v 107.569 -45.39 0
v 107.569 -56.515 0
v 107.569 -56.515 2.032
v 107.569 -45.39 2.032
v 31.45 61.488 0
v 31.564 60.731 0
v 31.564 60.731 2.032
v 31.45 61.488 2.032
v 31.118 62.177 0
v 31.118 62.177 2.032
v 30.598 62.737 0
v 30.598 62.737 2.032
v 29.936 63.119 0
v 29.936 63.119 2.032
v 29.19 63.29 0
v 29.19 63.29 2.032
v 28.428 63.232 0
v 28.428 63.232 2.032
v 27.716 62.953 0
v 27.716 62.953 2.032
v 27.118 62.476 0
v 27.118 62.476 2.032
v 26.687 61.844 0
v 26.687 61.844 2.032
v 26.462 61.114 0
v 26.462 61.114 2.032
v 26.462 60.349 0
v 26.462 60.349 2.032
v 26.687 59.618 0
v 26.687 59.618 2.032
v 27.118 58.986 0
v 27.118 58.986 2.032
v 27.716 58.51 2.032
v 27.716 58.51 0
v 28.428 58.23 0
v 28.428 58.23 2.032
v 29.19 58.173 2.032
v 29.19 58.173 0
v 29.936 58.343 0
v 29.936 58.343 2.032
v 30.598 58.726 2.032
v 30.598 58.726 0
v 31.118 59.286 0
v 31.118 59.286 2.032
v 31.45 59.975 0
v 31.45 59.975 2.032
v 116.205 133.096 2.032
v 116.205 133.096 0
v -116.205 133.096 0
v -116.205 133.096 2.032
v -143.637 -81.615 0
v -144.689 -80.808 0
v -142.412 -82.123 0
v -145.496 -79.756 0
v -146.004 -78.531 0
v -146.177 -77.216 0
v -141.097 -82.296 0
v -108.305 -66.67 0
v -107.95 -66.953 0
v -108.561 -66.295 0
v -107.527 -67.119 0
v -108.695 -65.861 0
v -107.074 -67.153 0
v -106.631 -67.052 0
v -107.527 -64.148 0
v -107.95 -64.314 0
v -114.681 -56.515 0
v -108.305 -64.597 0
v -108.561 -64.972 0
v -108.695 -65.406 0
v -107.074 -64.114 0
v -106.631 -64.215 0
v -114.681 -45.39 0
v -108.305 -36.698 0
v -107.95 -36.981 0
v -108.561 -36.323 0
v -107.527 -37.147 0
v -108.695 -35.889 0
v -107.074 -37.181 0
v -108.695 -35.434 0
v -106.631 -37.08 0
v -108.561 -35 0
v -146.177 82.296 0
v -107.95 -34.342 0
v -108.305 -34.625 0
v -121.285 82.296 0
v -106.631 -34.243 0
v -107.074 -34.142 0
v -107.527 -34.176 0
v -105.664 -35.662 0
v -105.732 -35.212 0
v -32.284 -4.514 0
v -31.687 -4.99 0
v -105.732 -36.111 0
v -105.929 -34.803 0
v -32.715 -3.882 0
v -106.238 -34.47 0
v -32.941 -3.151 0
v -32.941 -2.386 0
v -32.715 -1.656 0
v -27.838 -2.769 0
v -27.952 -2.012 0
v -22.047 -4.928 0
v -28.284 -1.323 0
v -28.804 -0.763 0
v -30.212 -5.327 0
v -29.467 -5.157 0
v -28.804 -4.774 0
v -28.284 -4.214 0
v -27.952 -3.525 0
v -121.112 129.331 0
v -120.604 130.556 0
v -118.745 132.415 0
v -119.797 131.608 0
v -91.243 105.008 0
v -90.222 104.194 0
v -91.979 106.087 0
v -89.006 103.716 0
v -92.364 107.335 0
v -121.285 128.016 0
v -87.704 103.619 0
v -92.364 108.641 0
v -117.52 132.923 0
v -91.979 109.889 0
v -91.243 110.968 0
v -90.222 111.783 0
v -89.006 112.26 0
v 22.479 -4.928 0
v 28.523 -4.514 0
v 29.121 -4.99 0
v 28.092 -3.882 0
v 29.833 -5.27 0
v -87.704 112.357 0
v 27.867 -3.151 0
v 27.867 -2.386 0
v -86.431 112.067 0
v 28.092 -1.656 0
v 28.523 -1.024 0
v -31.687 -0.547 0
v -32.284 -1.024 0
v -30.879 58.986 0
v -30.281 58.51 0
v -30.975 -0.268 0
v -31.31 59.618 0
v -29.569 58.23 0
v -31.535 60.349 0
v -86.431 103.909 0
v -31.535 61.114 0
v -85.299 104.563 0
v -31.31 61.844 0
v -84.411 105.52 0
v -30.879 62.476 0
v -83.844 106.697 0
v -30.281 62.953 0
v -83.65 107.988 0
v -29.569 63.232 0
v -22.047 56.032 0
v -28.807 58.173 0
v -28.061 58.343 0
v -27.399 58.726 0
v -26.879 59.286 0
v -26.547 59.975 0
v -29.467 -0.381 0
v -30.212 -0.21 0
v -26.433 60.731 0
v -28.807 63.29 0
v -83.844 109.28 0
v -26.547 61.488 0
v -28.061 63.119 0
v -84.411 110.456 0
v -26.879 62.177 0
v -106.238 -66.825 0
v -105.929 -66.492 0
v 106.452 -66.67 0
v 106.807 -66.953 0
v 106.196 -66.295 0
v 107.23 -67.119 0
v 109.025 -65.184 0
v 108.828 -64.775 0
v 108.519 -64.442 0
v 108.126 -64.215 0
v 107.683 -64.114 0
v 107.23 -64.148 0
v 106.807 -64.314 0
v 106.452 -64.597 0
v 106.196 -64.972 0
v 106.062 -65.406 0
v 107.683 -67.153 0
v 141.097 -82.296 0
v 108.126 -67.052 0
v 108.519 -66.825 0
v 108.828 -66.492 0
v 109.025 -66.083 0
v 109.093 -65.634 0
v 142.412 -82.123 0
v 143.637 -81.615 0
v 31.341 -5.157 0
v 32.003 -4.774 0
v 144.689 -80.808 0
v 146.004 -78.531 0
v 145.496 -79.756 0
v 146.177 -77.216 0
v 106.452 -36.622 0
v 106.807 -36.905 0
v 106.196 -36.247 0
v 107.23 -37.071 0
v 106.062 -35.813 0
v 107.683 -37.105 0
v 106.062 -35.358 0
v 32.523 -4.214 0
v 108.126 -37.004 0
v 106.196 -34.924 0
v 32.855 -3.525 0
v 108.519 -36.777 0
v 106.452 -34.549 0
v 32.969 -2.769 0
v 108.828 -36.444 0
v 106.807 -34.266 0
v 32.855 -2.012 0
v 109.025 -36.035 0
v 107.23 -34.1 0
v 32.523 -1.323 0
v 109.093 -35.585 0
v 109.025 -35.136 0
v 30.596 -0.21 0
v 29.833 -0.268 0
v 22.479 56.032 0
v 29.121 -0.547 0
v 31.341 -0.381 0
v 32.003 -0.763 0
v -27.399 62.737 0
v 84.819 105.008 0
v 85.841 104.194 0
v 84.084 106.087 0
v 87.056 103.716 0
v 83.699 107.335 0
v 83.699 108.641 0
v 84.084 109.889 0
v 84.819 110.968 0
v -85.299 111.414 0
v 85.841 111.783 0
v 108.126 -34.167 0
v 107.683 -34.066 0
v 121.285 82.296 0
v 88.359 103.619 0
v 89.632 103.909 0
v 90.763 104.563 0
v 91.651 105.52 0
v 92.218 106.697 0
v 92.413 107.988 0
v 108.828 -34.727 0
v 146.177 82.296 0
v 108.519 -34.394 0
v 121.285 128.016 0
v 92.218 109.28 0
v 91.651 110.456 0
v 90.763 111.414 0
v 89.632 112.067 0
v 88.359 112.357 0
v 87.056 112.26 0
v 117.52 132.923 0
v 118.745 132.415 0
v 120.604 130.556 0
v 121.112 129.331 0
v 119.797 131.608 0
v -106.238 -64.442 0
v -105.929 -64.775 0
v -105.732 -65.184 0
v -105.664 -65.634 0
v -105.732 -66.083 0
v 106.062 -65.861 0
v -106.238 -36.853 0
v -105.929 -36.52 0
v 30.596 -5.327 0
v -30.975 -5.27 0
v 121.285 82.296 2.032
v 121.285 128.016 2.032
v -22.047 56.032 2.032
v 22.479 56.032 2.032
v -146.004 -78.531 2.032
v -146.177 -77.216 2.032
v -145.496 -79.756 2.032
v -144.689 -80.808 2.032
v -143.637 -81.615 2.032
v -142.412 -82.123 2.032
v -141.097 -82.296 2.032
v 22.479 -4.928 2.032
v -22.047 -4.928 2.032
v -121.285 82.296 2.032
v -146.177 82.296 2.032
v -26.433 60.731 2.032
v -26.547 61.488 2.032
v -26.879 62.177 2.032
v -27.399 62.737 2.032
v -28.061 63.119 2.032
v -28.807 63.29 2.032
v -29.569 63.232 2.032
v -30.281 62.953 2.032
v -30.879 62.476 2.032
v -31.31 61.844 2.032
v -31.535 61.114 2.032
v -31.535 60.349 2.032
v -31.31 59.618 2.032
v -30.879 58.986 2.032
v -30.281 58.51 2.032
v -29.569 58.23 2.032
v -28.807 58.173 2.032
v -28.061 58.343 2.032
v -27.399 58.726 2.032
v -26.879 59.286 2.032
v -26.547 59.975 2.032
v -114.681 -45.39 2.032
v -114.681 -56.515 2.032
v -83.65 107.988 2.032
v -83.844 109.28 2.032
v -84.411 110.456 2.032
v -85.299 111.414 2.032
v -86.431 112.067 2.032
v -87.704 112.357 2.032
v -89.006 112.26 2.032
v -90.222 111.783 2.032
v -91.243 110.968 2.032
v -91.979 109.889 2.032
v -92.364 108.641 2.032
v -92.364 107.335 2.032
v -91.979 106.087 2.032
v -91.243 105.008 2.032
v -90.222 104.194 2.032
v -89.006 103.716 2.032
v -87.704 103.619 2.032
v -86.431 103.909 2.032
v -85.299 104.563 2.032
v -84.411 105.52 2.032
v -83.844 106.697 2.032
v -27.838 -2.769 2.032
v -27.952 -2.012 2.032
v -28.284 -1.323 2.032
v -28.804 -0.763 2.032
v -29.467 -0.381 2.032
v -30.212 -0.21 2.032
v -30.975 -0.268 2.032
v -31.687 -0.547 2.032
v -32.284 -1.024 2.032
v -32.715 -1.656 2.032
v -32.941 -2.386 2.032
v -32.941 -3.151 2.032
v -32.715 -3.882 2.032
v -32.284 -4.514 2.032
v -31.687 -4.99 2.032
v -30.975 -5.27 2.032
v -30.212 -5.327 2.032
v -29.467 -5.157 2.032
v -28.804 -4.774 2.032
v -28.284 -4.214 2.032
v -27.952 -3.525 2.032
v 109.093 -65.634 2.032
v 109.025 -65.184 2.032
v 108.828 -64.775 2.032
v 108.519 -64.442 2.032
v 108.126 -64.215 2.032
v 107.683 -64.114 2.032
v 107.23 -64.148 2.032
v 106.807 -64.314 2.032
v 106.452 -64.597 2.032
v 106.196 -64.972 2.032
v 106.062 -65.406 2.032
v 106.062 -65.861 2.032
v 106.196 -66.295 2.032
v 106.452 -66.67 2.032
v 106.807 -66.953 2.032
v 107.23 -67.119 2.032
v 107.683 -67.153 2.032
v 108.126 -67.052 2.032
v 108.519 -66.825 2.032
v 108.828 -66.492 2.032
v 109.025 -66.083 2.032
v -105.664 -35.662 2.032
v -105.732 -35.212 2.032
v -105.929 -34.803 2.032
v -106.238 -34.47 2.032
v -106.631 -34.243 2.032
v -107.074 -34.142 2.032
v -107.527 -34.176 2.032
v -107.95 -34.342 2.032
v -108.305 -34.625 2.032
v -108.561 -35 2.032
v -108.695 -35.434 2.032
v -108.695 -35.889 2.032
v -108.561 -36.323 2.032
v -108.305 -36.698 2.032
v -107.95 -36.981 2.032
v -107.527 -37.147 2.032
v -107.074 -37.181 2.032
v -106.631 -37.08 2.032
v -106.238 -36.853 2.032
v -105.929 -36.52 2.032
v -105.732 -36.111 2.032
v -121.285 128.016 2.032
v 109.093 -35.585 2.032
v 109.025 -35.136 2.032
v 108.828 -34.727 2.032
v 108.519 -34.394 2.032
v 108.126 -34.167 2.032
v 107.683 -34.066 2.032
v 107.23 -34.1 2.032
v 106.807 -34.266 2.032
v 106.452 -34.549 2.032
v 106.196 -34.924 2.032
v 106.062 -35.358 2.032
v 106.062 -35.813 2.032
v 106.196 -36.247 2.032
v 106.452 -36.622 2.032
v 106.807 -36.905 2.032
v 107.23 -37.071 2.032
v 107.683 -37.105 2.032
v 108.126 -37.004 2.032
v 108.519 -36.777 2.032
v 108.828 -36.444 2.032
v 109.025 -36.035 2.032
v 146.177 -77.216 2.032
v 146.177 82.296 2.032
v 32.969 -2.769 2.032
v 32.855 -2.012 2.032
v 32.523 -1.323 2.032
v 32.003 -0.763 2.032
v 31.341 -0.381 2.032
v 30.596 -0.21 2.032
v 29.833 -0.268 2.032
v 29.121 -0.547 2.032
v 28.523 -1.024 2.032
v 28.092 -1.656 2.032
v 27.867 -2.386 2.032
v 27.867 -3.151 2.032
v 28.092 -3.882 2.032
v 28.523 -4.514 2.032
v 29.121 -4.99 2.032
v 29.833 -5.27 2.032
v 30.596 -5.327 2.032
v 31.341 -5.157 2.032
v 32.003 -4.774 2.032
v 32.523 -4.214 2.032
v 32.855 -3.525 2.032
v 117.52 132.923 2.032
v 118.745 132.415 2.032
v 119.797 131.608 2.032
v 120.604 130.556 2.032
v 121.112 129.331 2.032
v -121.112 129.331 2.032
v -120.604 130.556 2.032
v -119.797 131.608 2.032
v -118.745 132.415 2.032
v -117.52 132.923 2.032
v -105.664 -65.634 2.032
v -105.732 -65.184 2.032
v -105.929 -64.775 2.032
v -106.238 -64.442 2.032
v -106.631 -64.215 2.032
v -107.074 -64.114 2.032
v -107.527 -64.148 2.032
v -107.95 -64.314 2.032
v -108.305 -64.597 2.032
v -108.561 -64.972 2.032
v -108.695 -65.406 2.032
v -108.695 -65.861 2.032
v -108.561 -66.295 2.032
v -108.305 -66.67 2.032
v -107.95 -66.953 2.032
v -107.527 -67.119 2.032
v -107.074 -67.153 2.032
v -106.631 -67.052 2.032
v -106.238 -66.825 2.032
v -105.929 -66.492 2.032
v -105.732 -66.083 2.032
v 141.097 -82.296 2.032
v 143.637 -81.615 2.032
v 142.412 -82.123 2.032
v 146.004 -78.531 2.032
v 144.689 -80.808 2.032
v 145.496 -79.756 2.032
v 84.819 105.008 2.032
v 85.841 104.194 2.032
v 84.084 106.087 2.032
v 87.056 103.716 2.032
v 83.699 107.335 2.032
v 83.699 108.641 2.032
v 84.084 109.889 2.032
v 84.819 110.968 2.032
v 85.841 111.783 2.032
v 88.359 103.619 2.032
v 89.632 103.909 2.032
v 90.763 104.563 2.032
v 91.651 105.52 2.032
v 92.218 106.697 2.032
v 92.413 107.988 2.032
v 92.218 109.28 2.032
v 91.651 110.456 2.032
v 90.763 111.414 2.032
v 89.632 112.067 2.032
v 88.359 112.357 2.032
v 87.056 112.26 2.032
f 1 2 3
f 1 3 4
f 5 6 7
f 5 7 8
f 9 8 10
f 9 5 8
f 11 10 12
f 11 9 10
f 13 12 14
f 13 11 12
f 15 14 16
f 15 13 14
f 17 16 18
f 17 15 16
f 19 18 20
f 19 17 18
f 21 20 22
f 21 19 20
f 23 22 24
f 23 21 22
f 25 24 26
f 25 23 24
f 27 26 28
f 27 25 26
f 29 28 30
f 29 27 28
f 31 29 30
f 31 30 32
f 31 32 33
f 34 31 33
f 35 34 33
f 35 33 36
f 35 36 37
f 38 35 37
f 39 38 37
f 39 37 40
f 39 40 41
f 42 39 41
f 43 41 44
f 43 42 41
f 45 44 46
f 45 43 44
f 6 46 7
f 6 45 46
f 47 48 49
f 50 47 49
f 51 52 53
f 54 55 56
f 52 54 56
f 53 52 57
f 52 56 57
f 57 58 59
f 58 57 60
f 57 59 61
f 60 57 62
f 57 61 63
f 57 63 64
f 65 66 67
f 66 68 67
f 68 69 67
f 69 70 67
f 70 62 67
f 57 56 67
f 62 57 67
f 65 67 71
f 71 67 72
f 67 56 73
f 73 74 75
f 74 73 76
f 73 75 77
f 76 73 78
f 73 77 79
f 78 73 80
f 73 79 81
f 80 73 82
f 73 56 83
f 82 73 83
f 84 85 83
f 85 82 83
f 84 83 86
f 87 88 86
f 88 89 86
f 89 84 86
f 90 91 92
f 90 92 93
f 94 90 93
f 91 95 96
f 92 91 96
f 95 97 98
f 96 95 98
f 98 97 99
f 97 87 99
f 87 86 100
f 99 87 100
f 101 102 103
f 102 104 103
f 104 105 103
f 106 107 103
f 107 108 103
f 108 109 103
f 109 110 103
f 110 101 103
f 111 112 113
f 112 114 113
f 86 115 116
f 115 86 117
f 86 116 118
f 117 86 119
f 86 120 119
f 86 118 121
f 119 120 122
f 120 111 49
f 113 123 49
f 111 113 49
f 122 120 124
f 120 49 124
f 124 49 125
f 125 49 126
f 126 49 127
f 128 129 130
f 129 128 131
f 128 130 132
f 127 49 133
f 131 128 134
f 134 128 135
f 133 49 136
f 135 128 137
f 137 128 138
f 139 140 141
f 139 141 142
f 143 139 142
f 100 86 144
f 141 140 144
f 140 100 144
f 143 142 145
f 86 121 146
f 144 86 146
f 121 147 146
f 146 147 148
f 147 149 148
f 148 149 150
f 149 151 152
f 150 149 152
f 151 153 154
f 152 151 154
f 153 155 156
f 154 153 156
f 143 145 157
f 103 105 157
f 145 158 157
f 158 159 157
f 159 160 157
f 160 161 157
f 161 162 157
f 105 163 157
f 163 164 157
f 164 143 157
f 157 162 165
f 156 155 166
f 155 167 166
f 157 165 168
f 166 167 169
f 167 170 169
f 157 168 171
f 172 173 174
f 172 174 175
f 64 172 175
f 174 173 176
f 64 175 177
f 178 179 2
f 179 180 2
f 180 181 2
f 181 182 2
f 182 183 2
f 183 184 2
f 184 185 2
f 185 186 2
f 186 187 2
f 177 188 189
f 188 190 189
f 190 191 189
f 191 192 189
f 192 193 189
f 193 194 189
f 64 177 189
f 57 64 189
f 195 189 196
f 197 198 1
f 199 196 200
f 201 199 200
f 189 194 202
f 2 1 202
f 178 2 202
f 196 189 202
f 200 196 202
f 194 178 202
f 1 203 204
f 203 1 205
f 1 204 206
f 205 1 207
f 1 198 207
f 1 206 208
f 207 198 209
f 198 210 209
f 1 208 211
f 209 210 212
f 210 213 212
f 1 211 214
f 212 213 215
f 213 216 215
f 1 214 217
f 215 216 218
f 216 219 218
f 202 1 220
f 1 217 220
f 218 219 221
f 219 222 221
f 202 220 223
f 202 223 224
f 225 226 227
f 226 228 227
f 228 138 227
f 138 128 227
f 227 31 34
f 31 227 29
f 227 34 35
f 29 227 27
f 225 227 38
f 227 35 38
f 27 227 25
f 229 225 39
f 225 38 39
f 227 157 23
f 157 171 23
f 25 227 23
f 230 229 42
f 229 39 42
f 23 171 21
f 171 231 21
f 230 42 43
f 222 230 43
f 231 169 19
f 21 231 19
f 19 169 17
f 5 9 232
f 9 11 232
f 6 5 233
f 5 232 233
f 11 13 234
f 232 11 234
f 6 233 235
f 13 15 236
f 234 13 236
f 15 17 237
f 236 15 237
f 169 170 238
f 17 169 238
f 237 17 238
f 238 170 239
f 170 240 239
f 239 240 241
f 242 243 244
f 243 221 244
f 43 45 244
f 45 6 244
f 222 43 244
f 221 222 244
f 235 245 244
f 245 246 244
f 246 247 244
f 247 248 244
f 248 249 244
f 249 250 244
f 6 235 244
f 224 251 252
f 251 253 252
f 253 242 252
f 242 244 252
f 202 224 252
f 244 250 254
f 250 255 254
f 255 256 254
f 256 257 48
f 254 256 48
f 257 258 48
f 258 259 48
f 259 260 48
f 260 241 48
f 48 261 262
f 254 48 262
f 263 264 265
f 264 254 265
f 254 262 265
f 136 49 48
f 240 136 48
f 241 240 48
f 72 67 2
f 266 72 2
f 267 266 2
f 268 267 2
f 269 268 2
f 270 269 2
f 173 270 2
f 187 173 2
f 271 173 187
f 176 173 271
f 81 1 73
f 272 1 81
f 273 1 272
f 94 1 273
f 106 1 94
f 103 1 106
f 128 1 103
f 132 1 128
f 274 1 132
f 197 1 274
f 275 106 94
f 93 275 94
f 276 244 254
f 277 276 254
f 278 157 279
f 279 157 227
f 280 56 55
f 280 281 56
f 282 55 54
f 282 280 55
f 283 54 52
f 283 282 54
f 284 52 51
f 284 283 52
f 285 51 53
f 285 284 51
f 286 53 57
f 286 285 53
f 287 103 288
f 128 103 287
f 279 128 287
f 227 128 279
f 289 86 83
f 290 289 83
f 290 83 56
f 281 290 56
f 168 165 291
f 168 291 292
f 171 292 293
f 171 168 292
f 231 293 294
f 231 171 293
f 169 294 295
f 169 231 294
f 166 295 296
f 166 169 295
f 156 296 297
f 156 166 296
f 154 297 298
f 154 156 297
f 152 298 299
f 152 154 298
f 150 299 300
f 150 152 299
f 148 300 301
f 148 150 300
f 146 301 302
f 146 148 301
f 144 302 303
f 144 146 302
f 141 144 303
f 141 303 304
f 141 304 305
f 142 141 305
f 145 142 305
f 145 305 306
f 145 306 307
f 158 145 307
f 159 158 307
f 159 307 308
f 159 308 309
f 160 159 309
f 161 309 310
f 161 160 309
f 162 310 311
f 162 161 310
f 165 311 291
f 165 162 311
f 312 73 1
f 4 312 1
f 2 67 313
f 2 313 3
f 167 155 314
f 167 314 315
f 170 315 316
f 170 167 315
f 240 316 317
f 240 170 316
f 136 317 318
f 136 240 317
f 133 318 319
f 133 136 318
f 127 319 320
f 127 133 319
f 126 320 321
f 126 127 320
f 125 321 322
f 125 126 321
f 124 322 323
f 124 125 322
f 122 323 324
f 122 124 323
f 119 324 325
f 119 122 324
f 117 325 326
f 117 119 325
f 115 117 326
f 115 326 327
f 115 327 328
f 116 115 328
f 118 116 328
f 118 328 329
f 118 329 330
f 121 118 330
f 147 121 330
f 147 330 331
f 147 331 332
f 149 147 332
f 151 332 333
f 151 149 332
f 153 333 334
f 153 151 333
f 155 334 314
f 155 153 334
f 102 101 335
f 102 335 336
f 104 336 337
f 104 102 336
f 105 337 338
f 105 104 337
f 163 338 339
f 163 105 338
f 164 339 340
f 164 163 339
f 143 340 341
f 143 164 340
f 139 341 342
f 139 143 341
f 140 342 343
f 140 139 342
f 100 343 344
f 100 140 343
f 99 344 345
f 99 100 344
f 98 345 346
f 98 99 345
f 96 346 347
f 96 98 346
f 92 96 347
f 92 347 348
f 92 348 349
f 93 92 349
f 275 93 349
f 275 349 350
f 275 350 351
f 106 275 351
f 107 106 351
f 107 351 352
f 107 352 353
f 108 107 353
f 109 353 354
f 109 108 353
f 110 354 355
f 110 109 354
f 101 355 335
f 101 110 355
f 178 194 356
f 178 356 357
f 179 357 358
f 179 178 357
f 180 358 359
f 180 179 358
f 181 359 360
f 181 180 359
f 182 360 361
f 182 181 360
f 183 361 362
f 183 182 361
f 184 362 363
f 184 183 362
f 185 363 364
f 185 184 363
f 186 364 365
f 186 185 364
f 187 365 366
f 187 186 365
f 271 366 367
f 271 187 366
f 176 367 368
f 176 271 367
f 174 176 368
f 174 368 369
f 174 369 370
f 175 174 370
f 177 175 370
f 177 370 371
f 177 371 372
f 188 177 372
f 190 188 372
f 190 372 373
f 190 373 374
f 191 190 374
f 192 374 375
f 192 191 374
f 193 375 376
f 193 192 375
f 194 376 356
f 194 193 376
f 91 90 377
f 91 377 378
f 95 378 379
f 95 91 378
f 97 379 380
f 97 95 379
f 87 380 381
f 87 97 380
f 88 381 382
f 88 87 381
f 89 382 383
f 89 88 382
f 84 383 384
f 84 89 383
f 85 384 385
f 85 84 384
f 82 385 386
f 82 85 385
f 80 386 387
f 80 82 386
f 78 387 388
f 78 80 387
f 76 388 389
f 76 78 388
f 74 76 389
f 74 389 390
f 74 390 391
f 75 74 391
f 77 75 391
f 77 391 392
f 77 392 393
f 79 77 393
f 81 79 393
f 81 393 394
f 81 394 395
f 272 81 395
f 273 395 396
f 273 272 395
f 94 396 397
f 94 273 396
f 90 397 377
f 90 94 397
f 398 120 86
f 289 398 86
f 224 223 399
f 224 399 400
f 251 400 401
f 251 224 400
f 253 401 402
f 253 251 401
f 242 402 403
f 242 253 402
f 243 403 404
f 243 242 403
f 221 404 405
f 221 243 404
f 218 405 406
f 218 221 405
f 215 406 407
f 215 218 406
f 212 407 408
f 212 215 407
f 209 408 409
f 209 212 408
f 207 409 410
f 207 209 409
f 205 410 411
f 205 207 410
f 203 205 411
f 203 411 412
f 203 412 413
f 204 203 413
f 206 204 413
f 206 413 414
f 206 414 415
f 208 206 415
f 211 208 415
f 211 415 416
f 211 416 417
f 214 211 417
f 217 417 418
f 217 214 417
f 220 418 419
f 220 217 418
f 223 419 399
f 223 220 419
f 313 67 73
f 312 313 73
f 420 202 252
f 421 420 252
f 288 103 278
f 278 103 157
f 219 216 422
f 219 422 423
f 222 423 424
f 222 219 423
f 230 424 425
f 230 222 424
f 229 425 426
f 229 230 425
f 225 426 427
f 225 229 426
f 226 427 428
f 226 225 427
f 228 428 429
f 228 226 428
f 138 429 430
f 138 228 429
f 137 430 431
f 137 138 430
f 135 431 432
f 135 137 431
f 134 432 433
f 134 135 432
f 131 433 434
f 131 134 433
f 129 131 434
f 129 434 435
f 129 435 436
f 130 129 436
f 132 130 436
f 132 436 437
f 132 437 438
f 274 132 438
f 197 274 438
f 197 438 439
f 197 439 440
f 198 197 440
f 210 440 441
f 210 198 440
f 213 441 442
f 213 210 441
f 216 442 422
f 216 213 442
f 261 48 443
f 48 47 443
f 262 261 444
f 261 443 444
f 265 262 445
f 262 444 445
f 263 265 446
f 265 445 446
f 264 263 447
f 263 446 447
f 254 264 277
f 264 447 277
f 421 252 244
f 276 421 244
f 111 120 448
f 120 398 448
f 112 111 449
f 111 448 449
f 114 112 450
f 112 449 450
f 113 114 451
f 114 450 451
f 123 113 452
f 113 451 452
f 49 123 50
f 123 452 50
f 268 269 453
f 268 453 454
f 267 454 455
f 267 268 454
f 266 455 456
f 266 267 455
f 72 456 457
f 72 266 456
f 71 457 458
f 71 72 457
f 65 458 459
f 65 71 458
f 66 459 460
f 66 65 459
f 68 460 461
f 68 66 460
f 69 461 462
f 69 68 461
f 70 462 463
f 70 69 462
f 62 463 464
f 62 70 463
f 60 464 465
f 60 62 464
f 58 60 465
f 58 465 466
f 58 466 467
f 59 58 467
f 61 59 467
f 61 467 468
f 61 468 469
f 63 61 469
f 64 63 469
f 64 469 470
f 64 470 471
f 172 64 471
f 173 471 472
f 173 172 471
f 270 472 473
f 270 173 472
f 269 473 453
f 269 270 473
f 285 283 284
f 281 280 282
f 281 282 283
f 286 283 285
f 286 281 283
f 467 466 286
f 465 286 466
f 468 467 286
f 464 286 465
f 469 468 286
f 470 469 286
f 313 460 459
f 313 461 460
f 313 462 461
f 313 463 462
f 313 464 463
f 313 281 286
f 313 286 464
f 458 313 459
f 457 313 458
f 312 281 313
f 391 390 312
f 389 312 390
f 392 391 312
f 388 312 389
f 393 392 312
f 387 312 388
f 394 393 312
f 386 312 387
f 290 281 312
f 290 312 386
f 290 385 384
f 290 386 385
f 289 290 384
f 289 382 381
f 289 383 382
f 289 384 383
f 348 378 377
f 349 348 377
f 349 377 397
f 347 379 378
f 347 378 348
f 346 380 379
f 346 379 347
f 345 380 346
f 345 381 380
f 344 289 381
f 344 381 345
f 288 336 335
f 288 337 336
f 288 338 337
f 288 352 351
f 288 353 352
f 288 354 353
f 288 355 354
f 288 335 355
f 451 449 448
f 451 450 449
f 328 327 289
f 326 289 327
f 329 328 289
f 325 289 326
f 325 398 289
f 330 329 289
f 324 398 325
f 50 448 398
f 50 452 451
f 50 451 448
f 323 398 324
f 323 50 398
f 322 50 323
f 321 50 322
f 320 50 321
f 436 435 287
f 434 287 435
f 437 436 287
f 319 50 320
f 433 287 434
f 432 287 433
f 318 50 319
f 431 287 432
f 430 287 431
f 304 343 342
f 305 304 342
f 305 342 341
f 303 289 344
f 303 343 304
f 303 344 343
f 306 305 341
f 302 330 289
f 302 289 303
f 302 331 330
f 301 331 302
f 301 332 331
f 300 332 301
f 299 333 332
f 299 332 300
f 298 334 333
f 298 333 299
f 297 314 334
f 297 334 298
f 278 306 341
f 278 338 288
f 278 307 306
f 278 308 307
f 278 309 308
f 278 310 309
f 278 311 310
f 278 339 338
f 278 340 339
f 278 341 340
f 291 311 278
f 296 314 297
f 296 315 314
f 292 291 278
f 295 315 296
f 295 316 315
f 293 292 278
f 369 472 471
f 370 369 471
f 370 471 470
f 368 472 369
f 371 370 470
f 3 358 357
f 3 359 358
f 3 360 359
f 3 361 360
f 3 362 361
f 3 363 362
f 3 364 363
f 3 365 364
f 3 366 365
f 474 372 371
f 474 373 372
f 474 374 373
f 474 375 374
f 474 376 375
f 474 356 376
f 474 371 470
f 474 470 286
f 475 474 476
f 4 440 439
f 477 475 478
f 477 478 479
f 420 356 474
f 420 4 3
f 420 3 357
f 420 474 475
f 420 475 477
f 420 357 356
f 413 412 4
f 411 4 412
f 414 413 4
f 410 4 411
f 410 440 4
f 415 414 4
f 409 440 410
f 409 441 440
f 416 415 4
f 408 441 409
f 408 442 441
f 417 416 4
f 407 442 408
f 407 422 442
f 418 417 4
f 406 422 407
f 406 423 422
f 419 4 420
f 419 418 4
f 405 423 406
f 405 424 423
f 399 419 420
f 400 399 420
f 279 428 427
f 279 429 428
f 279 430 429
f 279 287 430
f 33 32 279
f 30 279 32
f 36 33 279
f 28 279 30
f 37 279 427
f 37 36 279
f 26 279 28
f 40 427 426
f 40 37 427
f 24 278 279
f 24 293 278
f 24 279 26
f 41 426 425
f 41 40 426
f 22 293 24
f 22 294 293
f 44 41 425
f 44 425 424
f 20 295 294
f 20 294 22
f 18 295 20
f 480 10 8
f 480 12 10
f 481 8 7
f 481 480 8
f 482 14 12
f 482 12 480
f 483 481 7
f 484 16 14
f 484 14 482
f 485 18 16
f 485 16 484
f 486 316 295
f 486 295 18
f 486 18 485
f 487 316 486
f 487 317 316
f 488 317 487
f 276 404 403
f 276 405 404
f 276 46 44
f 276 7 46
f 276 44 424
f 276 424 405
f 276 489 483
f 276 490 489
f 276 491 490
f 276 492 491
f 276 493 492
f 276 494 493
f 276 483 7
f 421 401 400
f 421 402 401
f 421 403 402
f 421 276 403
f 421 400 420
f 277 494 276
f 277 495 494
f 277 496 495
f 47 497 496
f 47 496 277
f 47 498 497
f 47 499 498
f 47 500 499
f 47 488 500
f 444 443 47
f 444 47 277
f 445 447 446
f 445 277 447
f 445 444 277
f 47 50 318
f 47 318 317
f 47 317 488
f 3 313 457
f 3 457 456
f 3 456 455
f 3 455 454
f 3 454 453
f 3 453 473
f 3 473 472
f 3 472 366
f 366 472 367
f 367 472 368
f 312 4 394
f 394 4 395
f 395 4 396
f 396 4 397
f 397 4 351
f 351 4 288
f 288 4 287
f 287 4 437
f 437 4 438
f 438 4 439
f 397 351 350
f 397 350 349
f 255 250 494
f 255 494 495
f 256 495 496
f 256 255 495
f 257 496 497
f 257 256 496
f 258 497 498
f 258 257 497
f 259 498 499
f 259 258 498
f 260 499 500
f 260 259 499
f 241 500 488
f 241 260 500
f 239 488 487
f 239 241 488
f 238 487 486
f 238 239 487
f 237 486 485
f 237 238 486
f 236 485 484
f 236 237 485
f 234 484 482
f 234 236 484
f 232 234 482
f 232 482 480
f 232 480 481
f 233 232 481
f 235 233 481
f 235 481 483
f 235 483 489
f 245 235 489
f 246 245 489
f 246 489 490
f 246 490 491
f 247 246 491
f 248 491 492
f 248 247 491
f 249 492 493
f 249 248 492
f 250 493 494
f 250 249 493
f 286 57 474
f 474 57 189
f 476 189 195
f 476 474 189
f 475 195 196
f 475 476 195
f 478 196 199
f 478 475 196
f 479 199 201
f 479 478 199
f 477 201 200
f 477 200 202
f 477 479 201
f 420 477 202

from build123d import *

# Parameters (mm, degrees)
F0_R     = 1.524
F0_W     = 222.25
F0_H     = 11.1252
F0_R_2   = 2.5654
F0_R_3   = 4.3815
F0_W_2   = 44.5262
F0_H_2   = 60.96
F1_DEPTH = 2.032
F2_R     = 5.08


with BuildPart() as f1:
    # F0 (on Top) → F1 (new body)
    with BuildSketch(Plane.XY):
        Polygon((-146.177, 82.296), (-146.177, -82.296), (146.177, -82.296), (146.177, 82.296), (121.285, 82.296), (121.285, 133.096), (-121.285, 133.096), (-121.285, 82.296), align=None)
        with Locations((-107.188, -65.6336)):
            Circle(F0_R, mode=Mode.SUBTRACT)
        with Locations((-107.188, -35.6616)):
            Circle(F0_R, mode=Mode.SUBTRACT)
        with Locations((-3.556, -50.9524)):
            Rectangle(F0_W, F0_H, mode=Mode.SUBTRACT)
        with Locations((-30.4038, -2.7686)):
            Circle(F0_R_2, mode=Mode.SUBTRACT)
        with Locations((107.569, -65.6336)):
            Circle(F0_R, mode=Mode.SUBTRACT)
        with Locations((107.569, -35.5854)):
            Circle(F0_R, mode=Mode.SUBTRACT)
        with Locations((30.4038, -2.7686)):
            Circle(F0_R_2, mode=Mode.SUBTRACT)
        with Locations((-28.998554, 60.7314)):
            Circle(F0_R_2, mode=Mode.SUBTRACT)
        with Locations((-88.03132, 107.9881)):
            Circle(F0_R_3, mode=Mode.SUBTRACT)
        with Locations((0.2159, 25.5524)):
            Rectangle(F0_W_2, F0_H_2, mode=Mode.SUBTRACT)
        with Locations((28.998554, 60.7314)):
            Circle(F0_R_2, mode=Mode.SUBTRACT)
        with Locations((88.03132, 107.9881)):
            Circle(F0_R_3, mode=Mode.SUBTRACT)
    extrude(amount=F1_DEPTH)

    # F2
    f2_edges = [f1.edges().sort_by_distance(p)[0] for p in [
        (121.285, 133.096, 1.016),
        (-121.285, 133.096, 1.016),
        (146.177, -82.296, 1.016),
        (-146.177, -82.296, 1.016),
    ]]
    fillet(f2_edges, radius=F2_R)


solid = f1.part
